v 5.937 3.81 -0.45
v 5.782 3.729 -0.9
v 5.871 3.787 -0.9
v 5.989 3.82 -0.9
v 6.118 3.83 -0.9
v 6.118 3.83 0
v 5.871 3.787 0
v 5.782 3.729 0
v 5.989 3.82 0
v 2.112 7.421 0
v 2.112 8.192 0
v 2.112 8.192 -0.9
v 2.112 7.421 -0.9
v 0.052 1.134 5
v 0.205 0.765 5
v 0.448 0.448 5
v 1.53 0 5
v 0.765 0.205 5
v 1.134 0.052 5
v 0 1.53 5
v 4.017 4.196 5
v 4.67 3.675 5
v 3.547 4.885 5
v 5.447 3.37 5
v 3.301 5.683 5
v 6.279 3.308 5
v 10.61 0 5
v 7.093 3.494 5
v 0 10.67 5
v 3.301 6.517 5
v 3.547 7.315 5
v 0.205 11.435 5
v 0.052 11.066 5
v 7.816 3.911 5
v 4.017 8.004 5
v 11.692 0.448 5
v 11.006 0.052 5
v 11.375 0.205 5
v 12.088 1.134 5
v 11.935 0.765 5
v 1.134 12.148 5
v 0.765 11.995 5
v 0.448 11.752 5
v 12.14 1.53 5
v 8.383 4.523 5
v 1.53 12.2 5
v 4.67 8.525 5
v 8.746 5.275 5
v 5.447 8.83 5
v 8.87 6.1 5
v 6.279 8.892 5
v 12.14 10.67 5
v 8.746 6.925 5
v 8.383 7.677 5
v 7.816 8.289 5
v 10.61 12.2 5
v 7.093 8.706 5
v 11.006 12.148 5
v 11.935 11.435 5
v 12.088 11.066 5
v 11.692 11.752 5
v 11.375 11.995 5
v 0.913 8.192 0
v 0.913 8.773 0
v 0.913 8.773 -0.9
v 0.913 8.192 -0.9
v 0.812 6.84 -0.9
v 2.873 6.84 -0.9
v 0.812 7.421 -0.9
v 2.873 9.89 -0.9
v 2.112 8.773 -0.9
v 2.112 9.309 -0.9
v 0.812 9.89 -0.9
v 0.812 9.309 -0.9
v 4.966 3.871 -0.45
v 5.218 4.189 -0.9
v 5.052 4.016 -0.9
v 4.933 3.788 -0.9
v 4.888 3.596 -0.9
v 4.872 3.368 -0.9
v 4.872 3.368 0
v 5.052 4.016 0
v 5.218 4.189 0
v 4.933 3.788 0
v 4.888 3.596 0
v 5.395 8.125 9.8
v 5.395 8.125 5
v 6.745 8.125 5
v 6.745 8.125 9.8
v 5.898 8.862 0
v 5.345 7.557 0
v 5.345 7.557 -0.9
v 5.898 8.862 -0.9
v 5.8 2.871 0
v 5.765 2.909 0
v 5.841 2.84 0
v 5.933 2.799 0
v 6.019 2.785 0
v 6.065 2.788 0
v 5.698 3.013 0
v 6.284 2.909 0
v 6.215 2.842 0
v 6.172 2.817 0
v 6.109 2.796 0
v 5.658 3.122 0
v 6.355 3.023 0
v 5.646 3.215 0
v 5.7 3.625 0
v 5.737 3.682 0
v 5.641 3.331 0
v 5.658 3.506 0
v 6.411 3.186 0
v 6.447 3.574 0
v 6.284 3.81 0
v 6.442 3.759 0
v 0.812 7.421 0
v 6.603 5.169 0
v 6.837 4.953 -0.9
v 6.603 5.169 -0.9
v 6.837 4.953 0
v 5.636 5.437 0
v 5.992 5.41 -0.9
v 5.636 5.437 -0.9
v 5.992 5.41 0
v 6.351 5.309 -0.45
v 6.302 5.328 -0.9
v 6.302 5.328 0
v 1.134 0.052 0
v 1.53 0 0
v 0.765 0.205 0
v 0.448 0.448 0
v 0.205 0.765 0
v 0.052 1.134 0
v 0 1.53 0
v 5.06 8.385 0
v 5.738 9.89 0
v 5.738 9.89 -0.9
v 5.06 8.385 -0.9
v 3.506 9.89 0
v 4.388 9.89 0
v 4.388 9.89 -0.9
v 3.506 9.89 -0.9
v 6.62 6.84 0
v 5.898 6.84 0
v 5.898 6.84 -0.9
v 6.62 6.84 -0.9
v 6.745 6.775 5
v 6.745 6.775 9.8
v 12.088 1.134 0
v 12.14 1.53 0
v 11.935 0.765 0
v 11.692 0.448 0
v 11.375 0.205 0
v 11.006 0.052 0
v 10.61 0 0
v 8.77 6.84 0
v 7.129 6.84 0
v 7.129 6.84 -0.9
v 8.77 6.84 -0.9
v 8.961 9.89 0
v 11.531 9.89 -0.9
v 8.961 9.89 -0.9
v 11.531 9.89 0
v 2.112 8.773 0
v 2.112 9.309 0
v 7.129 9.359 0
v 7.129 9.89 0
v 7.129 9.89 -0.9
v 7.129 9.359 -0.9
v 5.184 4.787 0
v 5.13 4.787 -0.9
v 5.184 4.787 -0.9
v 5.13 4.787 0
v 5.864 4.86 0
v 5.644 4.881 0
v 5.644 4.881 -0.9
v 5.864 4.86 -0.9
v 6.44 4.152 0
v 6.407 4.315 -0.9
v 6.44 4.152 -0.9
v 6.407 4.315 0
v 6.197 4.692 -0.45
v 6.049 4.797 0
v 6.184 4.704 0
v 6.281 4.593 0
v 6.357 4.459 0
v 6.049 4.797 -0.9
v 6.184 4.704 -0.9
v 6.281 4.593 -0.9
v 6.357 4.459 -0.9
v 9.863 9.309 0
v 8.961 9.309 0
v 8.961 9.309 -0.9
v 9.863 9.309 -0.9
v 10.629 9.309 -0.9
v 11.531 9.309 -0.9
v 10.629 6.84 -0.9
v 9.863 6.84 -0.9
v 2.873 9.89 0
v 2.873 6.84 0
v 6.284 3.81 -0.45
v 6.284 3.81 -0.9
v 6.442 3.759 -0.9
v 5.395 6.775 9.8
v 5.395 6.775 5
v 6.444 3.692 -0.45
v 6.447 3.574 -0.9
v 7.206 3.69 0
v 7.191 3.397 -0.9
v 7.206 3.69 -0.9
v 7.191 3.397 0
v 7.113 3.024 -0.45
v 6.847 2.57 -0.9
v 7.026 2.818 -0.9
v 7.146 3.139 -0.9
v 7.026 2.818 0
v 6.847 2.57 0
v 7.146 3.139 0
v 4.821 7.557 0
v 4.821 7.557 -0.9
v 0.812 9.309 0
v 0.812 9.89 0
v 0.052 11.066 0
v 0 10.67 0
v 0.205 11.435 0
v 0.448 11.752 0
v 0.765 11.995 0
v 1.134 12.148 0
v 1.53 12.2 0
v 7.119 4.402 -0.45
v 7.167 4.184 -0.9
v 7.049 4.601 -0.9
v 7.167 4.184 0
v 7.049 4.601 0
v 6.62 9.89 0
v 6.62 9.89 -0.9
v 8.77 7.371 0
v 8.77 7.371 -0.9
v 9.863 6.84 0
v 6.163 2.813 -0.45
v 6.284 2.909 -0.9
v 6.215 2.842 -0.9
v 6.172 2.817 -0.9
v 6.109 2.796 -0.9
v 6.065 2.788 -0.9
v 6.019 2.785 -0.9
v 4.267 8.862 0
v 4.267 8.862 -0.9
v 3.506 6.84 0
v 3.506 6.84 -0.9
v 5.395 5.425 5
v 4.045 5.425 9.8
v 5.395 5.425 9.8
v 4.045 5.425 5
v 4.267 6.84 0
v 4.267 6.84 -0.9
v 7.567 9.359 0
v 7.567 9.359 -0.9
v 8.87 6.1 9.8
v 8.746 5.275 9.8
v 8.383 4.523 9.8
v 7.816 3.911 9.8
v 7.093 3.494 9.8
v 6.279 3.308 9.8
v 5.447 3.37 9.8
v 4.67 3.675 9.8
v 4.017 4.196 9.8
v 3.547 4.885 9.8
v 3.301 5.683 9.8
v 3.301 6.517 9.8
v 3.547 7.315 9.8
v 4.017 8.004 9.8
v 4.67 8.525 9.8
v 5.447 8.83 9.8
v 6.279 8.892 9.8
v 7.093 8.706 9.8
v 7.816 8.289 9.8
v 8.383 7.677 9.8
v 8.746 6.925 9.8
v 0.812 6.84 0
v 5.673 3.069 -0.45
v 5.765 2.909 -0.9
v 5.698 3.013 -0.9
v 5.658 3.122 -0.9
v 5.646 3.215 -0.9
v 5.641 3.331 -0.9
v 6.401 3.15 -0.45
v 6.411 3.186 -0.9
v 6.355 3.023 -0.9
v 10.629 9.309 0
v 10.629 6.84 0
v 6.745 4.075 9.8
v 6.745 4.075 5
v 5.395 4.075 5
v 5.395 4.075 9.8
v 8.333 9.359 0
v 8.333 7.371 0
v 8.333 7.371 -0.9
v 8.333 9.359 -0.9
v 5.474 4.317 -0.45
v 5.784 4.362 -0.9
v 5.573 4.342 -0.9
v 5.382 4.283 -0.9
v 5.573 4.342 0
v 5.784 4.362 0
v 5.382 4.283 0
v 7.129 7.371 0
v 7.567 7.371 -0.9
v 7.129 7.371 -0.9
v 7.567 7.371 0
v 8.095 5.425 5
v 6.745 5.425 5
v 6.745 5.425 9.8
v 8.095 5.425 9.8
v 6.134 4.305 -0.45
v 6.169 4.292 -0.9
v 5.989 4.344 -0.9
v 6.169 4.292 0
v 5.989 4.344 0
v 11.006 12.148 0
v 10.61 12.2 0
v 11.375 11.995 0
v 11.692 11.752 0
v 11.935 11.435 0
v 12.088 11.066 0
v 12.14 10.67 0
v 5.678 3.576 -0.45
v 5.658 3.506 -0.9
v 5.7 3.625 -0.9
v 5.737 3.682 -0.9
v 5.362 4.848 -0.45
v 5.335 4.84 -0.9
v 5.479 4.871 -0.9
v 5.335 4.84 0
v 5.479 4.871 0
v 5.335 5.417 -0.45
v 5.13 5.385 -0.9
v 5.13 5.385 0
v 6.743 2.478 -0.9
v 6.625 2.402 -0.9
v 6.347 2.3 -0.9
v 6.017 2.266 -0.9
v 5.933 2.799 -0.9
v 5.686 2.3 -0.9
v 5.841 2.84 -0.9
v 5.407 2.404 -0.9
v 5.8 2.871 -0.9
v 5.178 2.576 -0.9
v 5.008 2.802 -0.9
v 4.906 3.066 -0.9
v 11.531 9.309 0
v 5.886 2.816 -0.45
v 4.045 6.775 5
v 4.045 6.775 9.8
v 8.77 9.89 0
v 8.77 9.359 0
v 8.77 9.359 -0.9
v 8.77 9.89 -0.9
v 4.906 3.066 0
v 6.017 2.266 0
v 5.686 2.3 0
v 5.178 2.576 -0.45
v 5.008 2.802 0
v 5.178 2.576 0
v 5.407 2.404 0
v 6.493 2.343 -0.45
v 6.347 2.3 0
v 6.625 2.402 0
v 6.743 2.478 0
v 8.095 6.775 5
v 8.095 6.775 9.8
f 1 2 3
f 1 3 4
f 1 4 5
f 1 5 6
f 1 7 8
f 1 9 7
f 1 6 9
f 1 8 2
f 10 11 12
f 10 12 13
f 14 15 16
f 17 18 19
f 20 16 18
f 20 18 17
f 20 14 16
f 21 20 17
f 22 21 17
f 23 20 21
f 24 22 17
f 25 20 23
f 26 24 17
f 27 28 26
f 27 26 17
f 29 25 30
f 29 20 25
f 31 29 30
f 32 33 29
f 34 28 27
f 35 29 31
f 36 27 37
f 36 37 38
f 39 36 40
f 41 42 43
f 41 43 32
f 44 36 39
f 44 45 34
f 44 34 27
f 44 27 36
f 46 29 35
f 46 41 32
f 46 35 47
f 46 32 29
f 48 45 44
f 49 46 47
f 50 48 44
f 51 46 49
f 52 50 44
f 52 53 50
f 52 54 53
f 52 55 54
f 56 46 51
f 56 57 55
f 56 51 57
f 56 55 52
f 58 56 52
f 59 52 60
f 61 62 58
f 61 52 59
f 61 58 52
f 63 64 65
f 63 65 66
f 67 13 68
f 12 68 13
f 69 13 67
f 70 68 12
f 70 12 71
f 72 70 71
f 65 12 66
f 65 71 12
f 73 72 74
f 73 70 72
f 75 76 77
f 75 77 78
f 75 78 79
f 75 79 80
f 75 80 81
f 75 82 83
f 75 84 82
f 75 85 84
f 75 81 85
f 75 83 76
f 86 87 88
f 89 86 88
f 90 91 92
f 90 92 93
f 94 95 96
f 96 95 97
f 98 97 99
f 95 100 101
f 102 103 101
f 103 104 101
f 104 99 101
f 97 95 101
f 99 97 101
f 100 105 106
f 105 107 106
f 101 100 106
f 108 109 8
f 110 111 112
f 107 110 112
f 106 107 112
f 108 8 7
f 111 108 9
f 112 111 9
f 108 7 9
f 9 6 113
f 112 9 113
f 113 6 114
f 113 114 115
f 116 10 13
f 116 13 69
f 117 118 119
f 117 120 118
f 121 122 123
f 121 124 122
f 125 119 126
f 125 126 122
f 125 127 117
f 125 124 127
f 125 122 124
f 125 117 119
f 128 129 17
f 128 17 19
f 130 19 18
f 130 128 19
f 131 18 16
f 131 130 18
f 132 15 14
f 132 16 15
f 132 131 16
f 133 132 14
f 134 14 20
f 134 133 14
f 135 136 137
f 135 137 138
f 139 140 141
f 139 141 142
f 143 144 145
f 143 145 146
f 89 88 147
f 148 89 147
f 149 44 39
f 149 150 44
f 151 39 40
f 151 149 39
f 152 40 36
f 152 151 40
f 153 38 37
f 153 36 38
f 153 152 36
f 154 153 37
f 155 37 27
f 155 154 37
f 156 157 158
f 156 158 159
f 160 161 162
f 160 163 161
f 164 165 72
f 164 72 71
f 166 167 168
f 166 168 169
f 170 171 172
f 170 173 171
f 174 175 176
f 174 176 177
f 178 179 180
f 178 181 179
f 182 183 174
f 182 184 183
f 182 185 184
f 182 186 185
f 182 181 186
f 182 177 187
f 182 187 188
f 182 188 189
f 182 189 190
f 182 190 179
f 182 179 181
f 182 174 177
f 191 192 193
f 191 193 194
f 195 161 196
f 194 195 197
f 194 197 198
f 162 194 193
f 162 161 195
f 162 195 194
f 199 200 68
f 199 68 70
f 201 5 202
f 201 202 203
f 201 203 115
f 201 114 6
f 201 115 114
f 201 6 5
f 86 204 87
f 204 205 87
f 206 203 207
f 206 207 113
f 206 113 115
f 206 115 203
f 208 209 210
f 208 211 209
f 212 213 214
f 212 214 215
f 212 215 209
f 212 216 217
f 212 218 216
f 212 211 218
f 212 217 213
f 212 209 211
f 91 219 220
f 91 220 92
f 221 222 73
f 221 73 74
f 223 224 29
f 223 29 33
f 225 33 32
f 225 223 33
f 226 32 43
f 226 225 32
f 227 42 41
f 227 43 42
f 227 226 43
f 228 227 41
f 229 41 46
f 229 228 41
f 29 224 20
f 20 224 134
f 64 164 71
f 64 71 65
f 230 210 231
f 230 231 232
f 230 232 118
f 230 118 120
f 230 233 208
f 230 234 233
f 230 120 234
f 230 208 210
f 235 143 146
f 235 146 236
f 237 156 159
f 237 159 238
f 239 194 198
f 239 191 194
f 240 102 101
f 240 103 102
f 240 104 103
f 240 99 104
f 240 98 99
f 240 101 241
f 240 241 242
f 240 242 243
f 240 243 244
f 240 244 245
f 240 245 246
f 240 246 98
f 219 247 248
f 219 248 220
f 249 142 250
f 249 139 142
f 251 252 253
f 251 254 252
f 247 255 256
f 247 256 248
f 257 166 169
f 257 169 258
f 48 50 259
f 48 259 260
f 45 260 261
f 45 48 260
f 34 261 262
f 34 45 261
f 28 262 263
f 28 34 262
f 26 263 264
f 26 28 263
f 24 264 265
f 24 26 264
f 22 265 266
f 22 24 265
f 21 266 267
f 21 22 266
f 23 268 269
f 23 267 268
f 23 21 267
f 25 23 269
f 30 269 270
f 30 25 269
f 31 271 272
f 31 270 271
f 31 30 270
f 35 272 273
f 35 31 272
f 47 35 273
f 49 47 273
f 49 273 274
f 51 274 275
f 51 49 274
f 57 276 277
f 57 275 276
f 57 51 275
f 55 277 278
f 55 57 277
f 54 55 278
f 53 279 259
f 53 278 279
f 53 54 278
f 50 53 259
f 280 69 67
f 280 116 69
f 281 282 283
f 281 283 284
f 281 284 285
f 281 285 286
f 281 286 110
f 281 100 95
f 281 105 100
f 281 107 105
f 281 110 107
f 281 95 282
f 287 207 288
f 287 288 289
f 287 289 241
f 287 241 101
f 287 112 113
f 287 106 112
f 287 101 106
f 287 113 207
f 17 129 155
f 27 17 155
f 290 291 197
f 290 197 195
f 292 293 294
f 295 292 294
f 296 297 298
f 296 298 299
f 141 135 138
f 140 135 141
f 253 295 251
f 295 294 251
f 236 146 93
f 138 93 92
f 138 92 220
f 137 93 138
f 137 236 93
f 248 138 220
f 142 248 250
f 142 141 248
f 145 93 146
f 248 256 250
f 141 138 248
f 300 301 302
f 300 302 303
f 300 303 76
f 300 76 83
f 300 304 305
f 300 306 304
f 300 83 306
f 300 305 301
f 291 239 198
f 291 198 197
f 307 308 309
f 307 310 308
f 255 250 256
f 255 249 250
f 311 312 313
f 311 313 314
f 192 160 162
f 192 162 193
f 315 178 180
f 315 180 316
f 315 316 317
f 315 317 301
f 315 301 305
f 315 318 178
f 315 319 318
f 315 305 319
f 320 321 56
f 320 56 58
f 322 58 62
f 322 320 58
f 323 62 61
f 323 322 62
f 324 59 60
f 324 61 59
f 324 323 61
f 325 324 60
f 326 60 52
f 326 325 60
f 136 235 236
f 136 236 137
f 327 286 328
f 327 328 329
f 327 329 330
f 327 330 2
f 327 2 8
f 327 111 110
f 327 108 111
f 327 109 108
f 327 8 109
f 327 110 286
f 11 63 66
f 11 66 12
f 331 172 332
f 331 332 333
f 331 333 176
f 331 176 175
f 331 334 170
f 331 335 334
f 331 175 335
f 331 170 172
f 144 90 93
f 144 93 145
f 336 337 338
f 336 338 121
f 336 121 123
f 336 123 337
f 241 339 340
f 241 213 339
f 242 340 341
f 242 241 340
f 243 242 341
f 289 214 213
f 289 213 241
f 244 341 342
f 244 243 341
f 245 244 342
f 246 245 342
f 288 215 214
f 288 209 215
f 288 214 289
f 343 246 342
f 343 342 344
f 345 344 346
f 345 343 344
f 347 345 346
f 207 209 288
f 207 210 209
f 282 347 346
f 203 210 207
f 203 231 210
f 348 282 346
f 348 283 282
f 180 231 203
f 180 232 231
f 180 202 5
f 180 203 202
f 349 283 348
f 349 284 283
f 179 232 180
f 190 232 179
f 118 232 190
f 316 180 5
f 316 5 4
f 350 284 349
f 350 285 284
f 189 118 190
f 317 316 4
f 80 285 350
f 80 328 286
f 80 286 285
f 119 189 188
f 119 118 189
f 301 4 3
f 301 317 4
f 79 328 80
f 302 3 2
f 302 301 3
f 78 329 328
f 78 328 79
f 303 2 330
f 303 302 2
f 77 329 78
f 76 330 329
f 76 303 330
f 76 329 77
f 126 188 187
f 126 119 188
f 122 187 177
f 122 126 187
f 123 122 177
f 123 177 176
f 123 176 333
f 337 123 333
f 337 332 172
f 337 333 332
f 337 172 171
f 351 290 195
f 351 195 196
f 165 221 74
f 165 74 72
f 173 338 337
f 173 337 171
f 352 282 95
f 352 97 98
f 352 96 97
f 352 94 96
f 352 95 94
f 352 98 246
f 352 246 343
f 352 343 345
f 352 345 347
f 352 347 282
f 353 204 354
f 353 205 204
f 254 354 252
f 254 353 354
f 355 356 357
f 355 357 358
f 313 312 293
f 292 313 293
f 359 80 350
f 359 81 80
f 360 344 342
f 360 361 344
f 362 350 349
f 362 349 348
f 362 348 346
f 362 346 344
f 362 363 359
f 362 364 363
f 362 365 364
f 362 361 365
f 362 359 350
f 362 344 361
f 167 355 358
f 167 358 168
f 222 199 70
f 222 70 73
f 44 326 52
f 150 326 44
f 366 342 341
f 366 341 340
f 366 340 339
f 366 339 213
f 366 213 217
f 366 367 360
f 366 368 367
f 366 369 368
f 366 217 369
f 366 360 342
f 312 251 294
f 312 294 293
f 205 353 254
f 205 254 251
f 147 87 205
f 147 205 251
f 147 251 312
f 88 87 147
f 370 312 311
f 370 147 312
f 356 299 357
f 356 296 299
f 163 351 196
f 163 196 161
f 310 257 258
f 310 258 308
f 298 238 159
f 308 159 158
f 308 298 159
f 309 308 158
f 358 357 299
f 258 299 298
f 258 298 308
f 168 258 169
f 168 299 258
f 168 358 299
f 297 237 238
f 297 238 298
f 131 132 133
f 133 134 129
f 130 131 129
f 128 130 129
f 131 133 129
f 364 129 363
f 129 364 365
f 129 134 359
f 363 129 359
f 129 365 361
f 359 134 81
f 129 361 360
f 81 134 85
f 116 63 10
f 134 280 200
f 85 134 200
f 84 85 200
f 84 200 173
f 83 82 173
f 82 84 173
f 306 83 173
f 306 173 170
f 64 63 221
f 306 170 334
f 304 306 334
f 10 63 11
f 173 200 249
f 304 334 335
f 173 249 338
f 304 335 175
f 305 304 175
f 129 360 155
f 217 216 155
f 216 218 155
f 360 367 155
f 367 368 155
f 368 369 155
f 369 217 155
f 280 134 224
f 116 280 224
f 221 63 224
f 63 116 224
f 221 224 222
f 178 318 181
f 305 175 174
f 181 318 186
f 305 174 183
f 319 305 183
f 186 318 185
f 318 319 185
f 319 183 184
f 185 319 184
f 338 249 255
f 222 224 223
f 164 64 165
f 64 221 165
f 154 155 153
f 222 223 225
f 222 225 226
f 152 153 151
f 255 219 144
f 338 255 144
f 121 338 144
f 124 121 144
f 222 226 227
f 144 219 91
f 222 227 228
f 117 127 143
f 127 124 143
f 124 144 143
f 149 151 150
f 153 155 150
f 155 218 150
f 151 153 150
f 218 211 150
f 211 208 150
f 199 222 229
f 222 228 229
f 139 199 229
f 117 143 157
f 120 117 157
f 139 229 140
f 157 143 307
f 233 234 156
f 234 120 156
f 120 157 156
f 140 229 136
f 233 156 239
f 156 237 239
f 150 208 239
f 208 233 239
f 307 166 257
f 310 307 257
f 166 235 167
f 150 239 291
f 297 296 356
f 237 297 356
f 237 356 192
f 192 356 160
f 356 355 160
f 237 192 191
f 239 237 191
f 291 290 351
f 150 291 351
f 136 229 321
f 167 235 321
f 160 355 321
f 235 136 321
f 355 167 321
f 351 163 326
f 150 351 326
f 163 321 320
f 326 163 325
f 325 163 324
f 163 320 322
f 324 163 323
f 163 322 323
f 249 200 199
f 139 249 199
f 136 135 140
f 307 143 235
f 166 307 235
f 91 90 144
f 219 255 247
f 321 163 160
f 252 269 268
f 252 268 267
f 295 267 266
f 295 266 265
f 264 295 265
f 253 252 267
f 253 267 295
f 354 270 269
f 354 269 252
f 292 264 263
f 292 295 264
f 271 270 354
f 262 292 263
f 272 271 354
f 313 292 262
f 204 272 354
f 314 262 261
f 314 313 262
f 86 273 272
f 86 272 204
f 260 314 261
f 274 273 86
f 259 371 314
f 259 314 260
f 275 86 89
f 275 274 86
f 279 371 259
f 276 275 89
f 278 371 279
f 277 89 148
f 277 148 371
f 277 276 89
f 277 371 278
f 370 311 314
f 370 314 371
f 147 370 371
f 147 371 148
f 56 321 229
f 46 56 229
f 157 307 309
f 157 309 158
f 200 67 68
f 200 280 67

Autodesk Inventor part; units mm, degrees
ref_plane "YZ Plane" through (0, 0, 0) normal (1, 0, 0) x (0, 1, 0)
ref_plane "XZ Plane" through (0, 0, 0) normal (0, 1, 0) x (-1, 0, 0)
sketch "Sketch1" plane through (0, 0, 0) normal (0, 0, 1) x (1, 0, 0)
  line L0 (14.6962, 12.74) -> (14.6962, 0) construction
  line L1 (10.61, 12.2) -> (1.53, 12.2)
  arc A0 (1.53, 12.2) -> (0, 10.67) centre (1.53, 10.67) ccw
  line L2 (0, 10.67) -> (0, 1.53)
  arc A1 (0, 1.53) -> (1.53, 0) centre (1.53, 1.53) ccw
  line L3 (1.53, 0) -> (10.61, 0)
  arc A2 (10.61, 0) -> (12.14, 1.53) centre (10.61, 1.53) ccw
  arc A3 (12.14, 10.67) -> (10.61, 12.2) centre (10.61, 10.67) ccw
  line L4 (12.14, 10.67) -> (12.14, 1.53)
  point P0 (0, 0)
  point P1 (0, 0)
  dimension "d10" = 12.74
ref_plane "Work Plane1" through (0, 0, 5) normal (0, 0, 1) x (1, 0, 0)
sketch "Sketch2" plane through (0, 0, 5) normal (0, 0, 1) x (1, 0, 0)
  line L0 (10.88, 12.74) -> (1.8, 12.74) projected
  line L1 (10.88, 12.74) -> (1.8, 12.74) projected
  arc A0 (1.8, 12.74) -> (0, 10.94) centre (1.8, 10.94) ccw projected
  line L2 (0, 10.94) -> (0, 1.8) projected
  arc A1 (0, 1.8) -> (1.8, 0) centre (1.8, 1.8) ccw projected
  line L3 (1.8, 0) -> (10.88, 0) projected
  arc A2 (10.88, 0) -> (12.68, 1.8) centre (10.88, 1.8) ccw projected
  line L4 (12.68, 1.8) -> (12.68, 10.94) projected
  arc A3 (12.68, 10.94) -> (10.88, 12.74) centre (10.88, 10.94) ccw projected
  circle A4 centre (6.34, 6.37) radius 2.8
  line L5 (5.665, 8.395) -> (7.015, 8.395)
  line L6 (7.015, 4.345) -> (5.665, 4.345)
  line L7 (5.665, 4.345) -> (7.015, 8.395) construction
  line L8 (5.665, 8.395) -> (7.015, 4.345) construction
  line L9 (8.365, 5.695) -> (8.365, 7.045)
  line L10 (4.315, 7.045) -> (4.315, 5.695)
  line L11 (4.315, 5.695) -> (8.365, 7.045) construction
  line L12 (8.365, 5.695) -> (4.315, 7.045) construction
  line L13 (4.315, 5.695) -> (5.665, 5.695)
  line L14 (7.015, 5.695) -> (8.365, 5.695)
  line L15 (5.665, 4.345) -> (5.665, 5.695)
  line L16 (5.665, 7.045) -> (5.665, 8.395)
  line L17 (8.365, 7.045) -> (7.015, 7.045)
  line L18 (5.665, 7.045) -> (4.315, 7.045)
  line L19 (7.015, 8.395) -> (7.015, 7.045)
  line L20 (7.015, 5.695) -> (7.015, 4.345)
  point P0 (0, 0)
  dimension "d3" = 5.6
  dimension "d4" = 4.05
  dimension "d5" = 1.35
  dimension "d6" = 4.05
  dimension "d7" = 1.35
extrude "Extrusion3" add sketch "Sketch1" along normal blind 5
sketch "Sketch3" plane through (0, 0, 5) normal (0, 0, 1) x (1, 0, 0)
  line L0 (10.61, 12.47) -> (1.53, 12.47)
  line L1 (10.61, 12.47) -> (1.53, 12.47)
  arc A0 (1.53, 12.47) -> (-0.27, 10.67) centre (1.53, 10.67) ccw
  line L2 (-0.27, 10.67) -> (-0.27, 1.53)
  arc A1 (-0.27, 1.53) -> (1.53, -0.27) centre (1.53, 1.53) ccw
  line L3 (1.53, -0.27) -> (10.61, -0.27)
  arc A2 (10.61, -0.27) -> (12.41, 1.53) centre (10.61, 1.53) ccw
  line L4 (12.41, 1.53) -> (12.41, 10.67)
  arc A3 (12.41, 10.67) -> (10.61, 12.47) centre (10.61, 10.67) ccw
  circle A4 centre (6.07, 6.1) radius 2.8
  line L5 (5.395, 8.125) -> (6.745, 8.125)
  line L6 (6.745, 4.075) -> (5.395, 4.075)
  line L7 (5.395, 4.075) -> (6.745, 8.125) construction
  line L8 (5.395, 8.125) -> (6.745, 4.075) construction
  line L9 (8.095, 5.425) -> (8.095, 6.775)
  line L10 (4.045, 6.775) -> (4.045, 5.425)
  line L11 (4.045, 5.425) -> (8.095, 6.775) construction
  line L12 (8.095, 5.425) -> (4.045, 6.775) construction
  line L13 (4.045, 5.425) -> (5.395, 5.425)
  line L14 (6.745, 5.425) -> (8.095, 5.425)
  line L15 (5.395, 4.075) -> (5.395, 5.425)
  line L16 (5.395, 6.775) -> (5.395, 8.125)
  line L17 (8.095, 6.775) -> (6.745, 6.775)
  line L18 (5.395, 6.775) -> (4.045, 6.775)
  line L19 (6.745, 8.125) -> (6.745, 6.775)
  line L20 (6.745, 5.425) -> (6.745, 4.075)
  line L21 (10.61, 12.2) -> (1.53, 12.2) projected
  line L22 (0, 10.67) -> (0, 1.53) projected
  point P0 (0, 0)
  point P1 (-0.27, -0.27)
  point P2 (6.07, 12.2)
  point P3 (0, 6.1)
  point P4 (6.07, 6.1)
  dimension "d14" = 5.6
  dimension "d15" = 4.05
  dimension "d16" = 1.35
  dimension "d17" = 4.05
  dimension "d18" = 1.35
extrude "Extrusion4" add sketch "Sketch3" along normal blind 4.8 contours A4
sketch "Sketch4" plane through (0, 0, 0) normal (0, 0, -1) x (-1, 0, 0)
  line L0 (-13.9436, 0) -> (-13.9436, 2.266)
  line L1 (-15.5559, 0) -> (-15.5559, 6.84)
  line L2 (-1.53, 0) -> (-10.61, 0) projected
  line L3 (-11.5311, 9.89) -> (-0.6089, 9.89) construction
  line L4 (-0.6089, 9.89) -> (-0.6089, 6.84) construction
  line L5 (-0.6089, 6.84) -> (-11.5311, 6.84) construction
  line L6 (-11.5311, 6.84) -> (-11.5311, 9.89) construction
  line L7 (-7.4059, 5.4371) -> (-4.7341, 5.4371) construction
  line L8 (-4.7341, 5.4371) -> (-4.7341, 2.266) construction
  line L9 (-4.7341, 2.266) -> (-7.4059, 2.266) construction
  line L10 (-7.4059, 2.266) -> (-7.4059, 5.4371) construction
  line L11 (-10.6289, 6.84) -> (-10.6289, 9.3092)
  line L12 (-10.6289, 9.3092) -> (-11.5311, 9.3092)
  line L13 (-11.5311, 9.3092) -> (-11.5311, 9.89)
  line L14 (-11.5311, 9.89) -> (-8.9606, 9.89)
  line L15 (-8.9606, 9.89) -> (-8.9606, 9.3092)
  line L16 (-8.9606, 9.3092) -> (-9.8627, 9.3092)
  line L17 (-9.8627, 9.3092) -> (-9.8627, 6.84)
  line L18 (-9.8627, 6.84) -> (-10.6289, 6.84)
  line L19 (-7.1291, 6.84) -> (-8.7703, 6.84)
  line L20 (-8.7703, 6.84) -> (-8.7703, 7.3714)
  line L21 (-8.7703, 7.3714) -> (-8.3328, 7.3714)
  line L22 (-8.3328, 7.3714) -> (-8.3328, 9.3586)
  line L23 (-8.3328, 9.3586) -> (-8.7703, 9.3586)
  line L24 (-8.7703, 9.3586) -> (-8.7703, 9.89)
  line L25 (-8.7703, 9.89) -> (-7.1291, 9.89)
  line L26 (-7.1291, 9.89) -> (-7.1291, 9.3586)
  line L27 (-7.1291, 9.3586) -> (-7.5666, 9.3586)
  line L28 (-7.5666, 9.3586) -> (-7.5666, 7.3714)
  line L29 (-7.5666, 7.3714) -> (-7.1291, 7.3714)
  line L30 (-7.1291, 7.3714) -> (-7.1291, 6.84)
  line L31 (-3.5057, 6.84) -> (-4.2669, 6.84)
  line L32 (-4.2669, 6.84) -> (-4.2669, 8.8618)
  line L33 (-4.2669, 8.8618) -> (-4.8206, 7.5568)
  line L34 (-4.8206, 7.5568) -> (-5.3446, 7.5568)
  line L35 (-5.3446, 7.5568) -> (-5.8982, 8.8618)
  line L36 (-5.8982, 8.8618) -> (-5.8982, 6.84)
  line L37 (-5.8982, 6.84) -> (-6.6199, 6.84)
  line L38 (-6.6199, 6.84) -> (-6.6199, 9.89)
  line L39 (-6.6199, 9.89) -> (-5.7376, 9.89)
  line L40 (-5.7376, 9.89) -> (-5.0603, 8.3848)
  line L41 (-5.0603, 8.3848) -> (-4.3881, 9.89)
  line L42 (-4.3881, 9.89) -> (-3.5057, 9.89)
  line L43 (-3.5057, 9.89) -> (-3.5057, 6.84)
  line L44 (-2.8729, 6.84) -> (-2.8729, 9.89)
  line L45 (-2.8729, 9.89) -> (-0.8116, 9.89)
  line L46 (-0.8116, 9.89) -> (-0.8116, 9.3092)
  line L47 (-0.8116, 9.3092) -> (-2.1117, 9.3092)
  line L48 (-2.1117, 9.3092) -> (-2.1117, 8.7728)
  line L49 (-2.1117, 8.7728) -> (-0.9129, 8.7728)
  line L50 (-0.9129, 8.7728) -> (-0.9129, 8.192)
  line L51 (-0.9129, 8.192) -> (-2.1117, 8.192)
  line L52 (-2.1117, 8.192) -> (-2.1117, 7.4208)
  line L53 (-2.1117, 7.4208) -> (-0.8116, 7.4208)
  line L54 (-0.8116, 7.4208) -> (-0.8116, 6.84)
  line L55 (-0.8116, 6.84) -> (-2.8729, 6.84)
  spline S0 degree 2 poles (-4.8725, 3.3684) (-4.8725, 2.8864) (-5.483, 2.266) (-6.0169, 2.266) knots 0 0 0 1 2 2 2
  spline S1 degree 2 poles (-6.0169, 2.266) (-6.2838, 2.266) (-6.7015, 2.4192) (-6.8473, 2.57) knots 0 0 0 1 2 2 2
  spline S2 degree 2 poles (-6.8473, 2.57) (-7.0203, 2.7455) (-7.2057, 3.3016) (-7.2057, 3.6897) knots 0 0 0 1 2 2 2
  spline S3 degree 2 poles (-7.2057, 3.6897) (-7.2057, 4.0901) (-7.0327, 4.7129) (-6.8374, 4.9527) knots 0 0 0 1 2 2 2
  spline S4 degree 2 poles (-6.8374, 4.9527) (-6.6521, 5.1801) (-6.049, 5.4371) (-5.6362, 5.4371) knots 0 0 0 1 2 2 2
  spline S5 degree 2 poles (-5.6362, 5.4371) (-5.4855, 5.4371) (-5.1839, 5.3976) (-5.1295, 5.3852) knots 0 0 0 1 2 2 2
  line L56 (-5.1295, 5.3852) -> (-5.1295, 4.7871)
  line L57 (-5.1295, 4.7871) -> (-5.1839, 4.7871)
  spline S6 degree 2 poles (-5.1839, 4.7871) (-5.2383, 4.8143) (-5.4855, 4.881) (-5.6436, 4.881) knots 0 0 0 1 2 2 2
  spline S7 degree 2 poles (-5.6436, 4.881) (-6.002, 4.881) (-6.3925, 4.5028) (-6.4395, 4.1519) knots 0 0 0 1 2 2 2
  spline S8 degree 2 poles (-6.4395, 4.1519) (-6.2887, 4.2483) (-5.9798, 4.3619) (-5.7845, 4.3619) knots 0 0 0 1 2 2 2
  spline S9 degree 2 poles (-5.7845, 4.3619) (-5.6189, 4.3619) (-5.3297, 4.273) (-5.2185, 4.1889) knots 0 0 0 1 2 2 2
  spline S10 degree 2 poles (-5.2185, 4.1889) (-5.0603, 4.0678) (-4.8725, 3.6748) (-4.8725, 3.3684) knots 0 0 0 1 2 2 2
  spline S11 degree 2 poles (-5.7648, 2.9086) (-5.7054, 2.9828) (-5.6412, 3.1558) (-5.6412, 3.3313) knots 0 0 0 1 2 2 2
  spline S12 degree 2 poles (-5.6412, 3.3313) (-5.6412, 3.4796) (-5.7153, 3.6724) (-5.7821, 3.7292) knots 0 0 0 1 2 2 2
  spline S13 degree 2 poles (-5.7821, 3.7292) (-5.8513, 3.7885) (-6.0218, 3.8305) (-6.1182, 3.8305) knots 0 0 0 1 2 2 2
  spline S14 degree 2 poles (-6.1182, 3.8305) (-6.1998, 3.8305) (-6.3678, 3.7885) (-6.442, 3.7589) knots 0 0 0 1 2 2 2
  spline S15 degree 2 poles (-6.442, 3.7589) (-6.442, 3.7391) (-6.4469, 3.6452) (-6.4469, 3.5735) knots 0 0 0 1 2 2 2
  spline S16 degree 2 poles (-6.4469, 3.5735) (-6.4469, 3.309) (-6.3555, 2.9902) (-6.2838, 2.9086) knots 0 0 0 1 2 2 2
  spline S17 degree 2 poles (-6.2838, 2.9086) (-6.2319, 2.8419) (-6.0935, 2.785) (-6.0193, 2.785) knots 0 0 0 1 2 2 2
  spline S18 degree 2 poles (-6.0193, 2.785) (-5.9575, 2.785) (-5.8142, 2.8468) (-5.7648, 2.9086) knots 0 0 0 1 2 2 2
  point P0 (0, 0)
  point P1 (-6.07, 0)
  point P2 (-6.07, 2.266)
  point P3 (-6.07, 6.84)
  point P4 (-6.07, 6.84)
  point P5 (-6.07, 2.266)
  dimension "d21" = 2.266
  dimension "d22" = 6.84
extrude "Extrusion5" add sketch "Sketch4" along normal blind 0.9
properties part number "IPC TIME 6 key"
